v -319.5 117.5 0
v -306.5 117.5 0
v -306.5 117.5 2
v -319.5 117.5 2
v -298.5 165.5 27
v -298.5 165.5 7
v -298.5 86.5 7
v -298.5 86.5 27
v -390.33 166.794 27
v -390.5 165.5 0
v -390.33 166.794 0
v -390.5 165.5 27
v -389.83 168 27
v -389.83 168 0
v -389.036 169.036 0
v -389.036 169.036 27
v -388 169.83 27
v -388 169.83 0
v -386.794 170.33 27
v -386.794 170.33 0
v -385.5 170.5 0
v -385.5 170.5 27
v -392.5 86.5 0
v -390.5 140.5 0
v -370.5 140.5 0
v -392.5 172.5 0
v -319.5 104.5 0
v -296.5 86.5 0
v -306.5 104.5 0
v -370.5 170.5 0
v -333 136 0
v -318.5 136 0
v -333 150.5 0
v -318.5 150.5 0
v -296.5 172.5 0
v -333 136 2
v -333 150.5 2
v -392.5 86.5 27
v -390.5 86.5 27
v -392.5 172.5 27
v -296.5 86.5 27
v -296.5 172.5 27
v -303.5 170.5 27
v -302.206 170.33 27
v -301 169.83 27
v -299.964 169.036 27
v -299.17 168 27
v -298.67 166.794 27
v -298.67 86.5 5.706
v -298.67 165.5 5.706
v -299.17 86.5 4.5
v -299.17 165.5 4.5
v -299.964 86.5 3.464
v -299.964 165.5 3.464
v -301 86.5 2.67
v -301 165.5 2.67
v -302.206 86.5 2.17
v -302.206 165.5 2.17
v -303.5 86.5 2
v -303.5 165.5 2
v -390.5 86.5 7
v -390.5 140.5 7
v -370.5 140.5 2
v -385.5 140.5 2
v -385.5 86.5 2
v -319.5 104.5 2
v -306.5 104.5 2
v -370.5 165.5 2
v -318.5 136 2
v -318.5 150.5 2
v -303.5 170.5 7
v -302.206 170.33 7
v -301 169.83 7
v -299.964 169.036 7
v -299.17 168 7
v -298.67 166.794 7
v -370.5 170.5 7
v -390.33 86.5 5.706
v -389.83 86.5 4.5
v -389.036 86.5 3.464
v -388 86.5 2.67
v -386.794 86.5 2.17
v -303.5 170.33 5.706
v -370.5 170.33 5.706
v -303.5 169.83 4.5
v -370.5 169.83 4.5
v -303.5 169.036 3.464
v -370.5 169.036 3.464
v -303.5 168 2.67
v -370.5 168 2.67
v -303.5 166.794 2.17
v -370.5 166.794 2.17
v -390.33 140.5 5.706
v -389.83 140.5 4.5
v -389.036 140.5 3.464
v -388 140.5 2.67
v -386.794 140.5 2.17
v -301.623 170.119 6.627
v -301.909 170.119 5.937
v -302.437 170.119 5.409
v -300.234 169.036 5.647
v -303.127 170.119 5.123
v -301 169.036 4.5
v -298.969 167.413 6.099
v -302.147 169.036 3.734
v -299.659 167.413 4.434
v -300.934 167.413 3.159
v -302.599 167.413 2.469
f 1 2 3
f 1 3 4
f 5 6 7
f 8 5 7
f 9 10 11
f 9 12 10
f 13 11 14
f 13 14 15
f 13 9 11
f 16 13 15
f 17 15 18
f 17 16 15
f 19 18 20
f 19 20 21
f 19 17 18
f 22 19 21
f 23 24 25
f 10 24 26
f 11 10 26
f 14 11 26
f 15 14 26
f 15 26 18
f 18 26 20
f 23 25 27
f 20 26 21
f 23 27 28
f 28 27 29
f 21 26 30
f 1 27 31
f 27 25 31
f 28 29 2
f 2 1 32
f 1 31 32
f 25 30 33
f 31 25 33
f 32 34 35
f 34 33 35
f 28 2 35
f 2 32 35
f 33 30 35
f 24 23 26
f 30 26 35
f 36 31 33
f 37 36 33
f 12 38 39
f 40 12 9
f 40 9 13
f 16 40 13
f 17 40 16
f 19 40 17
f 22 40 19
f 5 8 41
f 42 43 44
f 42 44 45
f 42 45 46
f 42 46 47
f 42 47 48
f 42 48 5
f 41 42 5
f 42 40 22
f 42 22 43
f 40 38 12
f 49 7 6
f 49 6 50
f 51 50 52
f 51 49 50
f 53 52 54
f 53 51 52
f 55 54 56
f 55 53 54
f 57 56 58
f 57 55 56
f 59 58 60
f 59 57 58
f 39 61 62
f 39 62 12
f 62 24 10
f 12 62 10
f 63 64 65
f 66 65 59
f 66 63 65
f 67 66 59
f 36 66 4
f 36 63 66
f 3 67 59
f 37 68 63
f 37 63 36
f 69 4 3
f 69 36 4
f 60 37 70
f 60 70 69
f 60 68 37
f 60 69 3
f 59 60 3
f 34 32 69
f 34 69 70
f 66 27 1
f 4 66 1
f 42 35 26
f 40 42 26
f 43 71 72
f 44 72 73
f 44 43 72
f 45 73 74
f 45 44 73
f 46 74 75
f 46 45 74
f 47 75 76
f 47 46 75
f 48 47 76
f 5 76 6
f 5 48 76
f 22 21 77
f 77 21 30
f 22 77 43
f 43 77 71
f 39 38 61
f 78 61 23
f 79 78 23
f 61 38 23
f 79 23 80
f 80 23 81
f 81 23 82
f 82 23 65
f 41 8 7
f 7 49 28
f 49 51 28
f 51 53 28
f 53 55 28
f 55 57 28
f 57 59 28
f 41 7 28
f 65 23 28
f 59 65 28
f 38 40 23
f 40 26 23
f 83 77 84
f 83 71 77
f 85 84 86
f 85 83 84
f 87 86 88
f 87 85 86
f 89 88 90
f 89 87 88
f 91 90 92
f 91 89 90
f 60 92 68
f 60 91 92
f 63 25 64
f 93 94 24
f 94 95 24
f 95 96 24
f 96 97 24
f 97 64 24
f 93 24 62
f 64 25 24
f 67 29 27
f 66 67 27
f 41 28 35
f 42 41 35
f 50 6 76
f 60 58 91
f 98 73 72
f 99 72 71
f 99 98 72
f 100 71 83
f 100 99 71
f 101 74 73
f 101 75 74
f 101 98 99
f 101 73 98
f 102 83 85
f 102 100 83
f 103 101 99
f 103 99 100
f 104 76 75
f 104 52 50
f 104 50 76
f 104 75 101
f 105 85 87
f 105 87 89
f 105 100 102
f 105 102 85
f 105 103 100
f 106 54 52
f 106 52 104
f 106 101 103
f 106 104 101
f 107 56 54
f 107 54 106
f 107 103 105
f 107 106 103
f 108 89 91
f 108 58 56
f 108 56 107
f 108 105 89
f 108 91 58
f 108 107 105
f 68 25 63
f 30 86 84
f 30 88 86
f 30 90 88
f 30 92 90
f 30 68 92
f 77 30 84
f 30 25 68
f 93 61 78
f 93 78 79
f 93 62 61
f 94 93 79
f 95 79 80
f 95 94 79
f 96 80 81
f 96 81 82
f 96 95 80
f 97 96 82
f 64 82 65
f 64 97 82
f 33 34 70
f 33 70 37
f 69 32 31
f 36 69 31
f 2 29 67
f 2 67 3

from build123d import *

# Parameters (mm, degrees)
SKETCH1_W           = 96
SKETCH1_H           = 86
BOSS_EXTRUDE1_DEPTH = 2
BOSS_EXTRUDE3_DEPTH = 25
SKETCH3_W           = 20
SKETCH3_H           = 30
CUT_EXTRUDE1_DEPTH  = 25
SKETCH4_W           = 14.5
SKETCH4_H           = 14.5
CUT_EXTRUDE2_DEPTH  = 25
SKETCH5_W           = 13
SKETCH5_H           = 13
CUT_EXTRUDE3_DEPTH  = 25
FILLET1_R           = 5


with BuildPart() as part:
    # Sketch1 → Boss-Extrude1 (new body)
    with BuildSketch(Plane.XY):
        with Locations((-344.5, 129.5)):
            Rectangle(SKETCH1_W, SKETCH1_H)
    extrude(amount=BOSS_EXTRUDE1_DEPTH)

    # Sketch2 → Boss-Extrude3 (add)
    with BuildSketch(Plane.XY.offset(2)):
        Polygon((-296.5, 170.5), (-296.5, 172.5), (-298.5, 172.5), (-390.5, 172.5), (-392.5, 172.5), (-392.5, 170.5), (-392.5, 86.5), (-390.5, 86.5), (-390.5, 170.5), (-298.5, 170.5), (-298.5, 86.5), (-296.5, 86.5), align=None)
    extrude(amount=BOSS_EXTRUDE3_DEPTH)

    # Sketch3 → Cut-Extrude1 (cut)
    with BuildSketch(Plane(origin=(0, 0, 0), x_dir=(-1, 0, 0), z_dir=(0, 0, -1))):
        with Locations((380.5, 155.5)):
            Rectangle(SKETCH3_W, SKETCH3_H)
    extrude(amount=-CUT_EXTRUDE1_DEPTH, mode=Mode.SUBTRACT)

    # Sketch4 → Cut-Extrude2 (cut)
    with BuildSketch(Plane(origin=(0, 0, 0), x_dir=(-1, 0, 0), z_dir=(0, 0, -1))):
        with Locations((325.75, 143.25)):
            Rectangle(SKETCH4_W, SKETCH4_H)
    extrude(amount=-CUT_EXTRUDE2_DEPTH, mode=Mode.SUBTRACT)

    # Sketch5 → Cut-Extrude3 (cut)
    with BuildSketch(Plane(origin=(0, 0, 0), x_dir=(-1, 0, 0), z_dir=(0, 0, -1))):
        with Locations((313, 111)):
            Rectangle(SKETCH5_W, SKETCH5_H)
    extrude(amount=-CUT_EXTRUDE3_DEPTH, mode=Mode.SUBTRACT)

    # Fillet1
    fillet1_edges = [part.edges().sort_by_distance(p)[0] for p in [
        (-390.5, 170.5, 13.5),
        (-298.5, 128.5, 2),
        (-298.5, 170.5, 14.5),
        (-334.5, 170.5, 2),
        (-390.5, 113.5, 2),
    ]]
    fillet(fillet1_edges, radius=FILLET1_R)


solid = part.part
